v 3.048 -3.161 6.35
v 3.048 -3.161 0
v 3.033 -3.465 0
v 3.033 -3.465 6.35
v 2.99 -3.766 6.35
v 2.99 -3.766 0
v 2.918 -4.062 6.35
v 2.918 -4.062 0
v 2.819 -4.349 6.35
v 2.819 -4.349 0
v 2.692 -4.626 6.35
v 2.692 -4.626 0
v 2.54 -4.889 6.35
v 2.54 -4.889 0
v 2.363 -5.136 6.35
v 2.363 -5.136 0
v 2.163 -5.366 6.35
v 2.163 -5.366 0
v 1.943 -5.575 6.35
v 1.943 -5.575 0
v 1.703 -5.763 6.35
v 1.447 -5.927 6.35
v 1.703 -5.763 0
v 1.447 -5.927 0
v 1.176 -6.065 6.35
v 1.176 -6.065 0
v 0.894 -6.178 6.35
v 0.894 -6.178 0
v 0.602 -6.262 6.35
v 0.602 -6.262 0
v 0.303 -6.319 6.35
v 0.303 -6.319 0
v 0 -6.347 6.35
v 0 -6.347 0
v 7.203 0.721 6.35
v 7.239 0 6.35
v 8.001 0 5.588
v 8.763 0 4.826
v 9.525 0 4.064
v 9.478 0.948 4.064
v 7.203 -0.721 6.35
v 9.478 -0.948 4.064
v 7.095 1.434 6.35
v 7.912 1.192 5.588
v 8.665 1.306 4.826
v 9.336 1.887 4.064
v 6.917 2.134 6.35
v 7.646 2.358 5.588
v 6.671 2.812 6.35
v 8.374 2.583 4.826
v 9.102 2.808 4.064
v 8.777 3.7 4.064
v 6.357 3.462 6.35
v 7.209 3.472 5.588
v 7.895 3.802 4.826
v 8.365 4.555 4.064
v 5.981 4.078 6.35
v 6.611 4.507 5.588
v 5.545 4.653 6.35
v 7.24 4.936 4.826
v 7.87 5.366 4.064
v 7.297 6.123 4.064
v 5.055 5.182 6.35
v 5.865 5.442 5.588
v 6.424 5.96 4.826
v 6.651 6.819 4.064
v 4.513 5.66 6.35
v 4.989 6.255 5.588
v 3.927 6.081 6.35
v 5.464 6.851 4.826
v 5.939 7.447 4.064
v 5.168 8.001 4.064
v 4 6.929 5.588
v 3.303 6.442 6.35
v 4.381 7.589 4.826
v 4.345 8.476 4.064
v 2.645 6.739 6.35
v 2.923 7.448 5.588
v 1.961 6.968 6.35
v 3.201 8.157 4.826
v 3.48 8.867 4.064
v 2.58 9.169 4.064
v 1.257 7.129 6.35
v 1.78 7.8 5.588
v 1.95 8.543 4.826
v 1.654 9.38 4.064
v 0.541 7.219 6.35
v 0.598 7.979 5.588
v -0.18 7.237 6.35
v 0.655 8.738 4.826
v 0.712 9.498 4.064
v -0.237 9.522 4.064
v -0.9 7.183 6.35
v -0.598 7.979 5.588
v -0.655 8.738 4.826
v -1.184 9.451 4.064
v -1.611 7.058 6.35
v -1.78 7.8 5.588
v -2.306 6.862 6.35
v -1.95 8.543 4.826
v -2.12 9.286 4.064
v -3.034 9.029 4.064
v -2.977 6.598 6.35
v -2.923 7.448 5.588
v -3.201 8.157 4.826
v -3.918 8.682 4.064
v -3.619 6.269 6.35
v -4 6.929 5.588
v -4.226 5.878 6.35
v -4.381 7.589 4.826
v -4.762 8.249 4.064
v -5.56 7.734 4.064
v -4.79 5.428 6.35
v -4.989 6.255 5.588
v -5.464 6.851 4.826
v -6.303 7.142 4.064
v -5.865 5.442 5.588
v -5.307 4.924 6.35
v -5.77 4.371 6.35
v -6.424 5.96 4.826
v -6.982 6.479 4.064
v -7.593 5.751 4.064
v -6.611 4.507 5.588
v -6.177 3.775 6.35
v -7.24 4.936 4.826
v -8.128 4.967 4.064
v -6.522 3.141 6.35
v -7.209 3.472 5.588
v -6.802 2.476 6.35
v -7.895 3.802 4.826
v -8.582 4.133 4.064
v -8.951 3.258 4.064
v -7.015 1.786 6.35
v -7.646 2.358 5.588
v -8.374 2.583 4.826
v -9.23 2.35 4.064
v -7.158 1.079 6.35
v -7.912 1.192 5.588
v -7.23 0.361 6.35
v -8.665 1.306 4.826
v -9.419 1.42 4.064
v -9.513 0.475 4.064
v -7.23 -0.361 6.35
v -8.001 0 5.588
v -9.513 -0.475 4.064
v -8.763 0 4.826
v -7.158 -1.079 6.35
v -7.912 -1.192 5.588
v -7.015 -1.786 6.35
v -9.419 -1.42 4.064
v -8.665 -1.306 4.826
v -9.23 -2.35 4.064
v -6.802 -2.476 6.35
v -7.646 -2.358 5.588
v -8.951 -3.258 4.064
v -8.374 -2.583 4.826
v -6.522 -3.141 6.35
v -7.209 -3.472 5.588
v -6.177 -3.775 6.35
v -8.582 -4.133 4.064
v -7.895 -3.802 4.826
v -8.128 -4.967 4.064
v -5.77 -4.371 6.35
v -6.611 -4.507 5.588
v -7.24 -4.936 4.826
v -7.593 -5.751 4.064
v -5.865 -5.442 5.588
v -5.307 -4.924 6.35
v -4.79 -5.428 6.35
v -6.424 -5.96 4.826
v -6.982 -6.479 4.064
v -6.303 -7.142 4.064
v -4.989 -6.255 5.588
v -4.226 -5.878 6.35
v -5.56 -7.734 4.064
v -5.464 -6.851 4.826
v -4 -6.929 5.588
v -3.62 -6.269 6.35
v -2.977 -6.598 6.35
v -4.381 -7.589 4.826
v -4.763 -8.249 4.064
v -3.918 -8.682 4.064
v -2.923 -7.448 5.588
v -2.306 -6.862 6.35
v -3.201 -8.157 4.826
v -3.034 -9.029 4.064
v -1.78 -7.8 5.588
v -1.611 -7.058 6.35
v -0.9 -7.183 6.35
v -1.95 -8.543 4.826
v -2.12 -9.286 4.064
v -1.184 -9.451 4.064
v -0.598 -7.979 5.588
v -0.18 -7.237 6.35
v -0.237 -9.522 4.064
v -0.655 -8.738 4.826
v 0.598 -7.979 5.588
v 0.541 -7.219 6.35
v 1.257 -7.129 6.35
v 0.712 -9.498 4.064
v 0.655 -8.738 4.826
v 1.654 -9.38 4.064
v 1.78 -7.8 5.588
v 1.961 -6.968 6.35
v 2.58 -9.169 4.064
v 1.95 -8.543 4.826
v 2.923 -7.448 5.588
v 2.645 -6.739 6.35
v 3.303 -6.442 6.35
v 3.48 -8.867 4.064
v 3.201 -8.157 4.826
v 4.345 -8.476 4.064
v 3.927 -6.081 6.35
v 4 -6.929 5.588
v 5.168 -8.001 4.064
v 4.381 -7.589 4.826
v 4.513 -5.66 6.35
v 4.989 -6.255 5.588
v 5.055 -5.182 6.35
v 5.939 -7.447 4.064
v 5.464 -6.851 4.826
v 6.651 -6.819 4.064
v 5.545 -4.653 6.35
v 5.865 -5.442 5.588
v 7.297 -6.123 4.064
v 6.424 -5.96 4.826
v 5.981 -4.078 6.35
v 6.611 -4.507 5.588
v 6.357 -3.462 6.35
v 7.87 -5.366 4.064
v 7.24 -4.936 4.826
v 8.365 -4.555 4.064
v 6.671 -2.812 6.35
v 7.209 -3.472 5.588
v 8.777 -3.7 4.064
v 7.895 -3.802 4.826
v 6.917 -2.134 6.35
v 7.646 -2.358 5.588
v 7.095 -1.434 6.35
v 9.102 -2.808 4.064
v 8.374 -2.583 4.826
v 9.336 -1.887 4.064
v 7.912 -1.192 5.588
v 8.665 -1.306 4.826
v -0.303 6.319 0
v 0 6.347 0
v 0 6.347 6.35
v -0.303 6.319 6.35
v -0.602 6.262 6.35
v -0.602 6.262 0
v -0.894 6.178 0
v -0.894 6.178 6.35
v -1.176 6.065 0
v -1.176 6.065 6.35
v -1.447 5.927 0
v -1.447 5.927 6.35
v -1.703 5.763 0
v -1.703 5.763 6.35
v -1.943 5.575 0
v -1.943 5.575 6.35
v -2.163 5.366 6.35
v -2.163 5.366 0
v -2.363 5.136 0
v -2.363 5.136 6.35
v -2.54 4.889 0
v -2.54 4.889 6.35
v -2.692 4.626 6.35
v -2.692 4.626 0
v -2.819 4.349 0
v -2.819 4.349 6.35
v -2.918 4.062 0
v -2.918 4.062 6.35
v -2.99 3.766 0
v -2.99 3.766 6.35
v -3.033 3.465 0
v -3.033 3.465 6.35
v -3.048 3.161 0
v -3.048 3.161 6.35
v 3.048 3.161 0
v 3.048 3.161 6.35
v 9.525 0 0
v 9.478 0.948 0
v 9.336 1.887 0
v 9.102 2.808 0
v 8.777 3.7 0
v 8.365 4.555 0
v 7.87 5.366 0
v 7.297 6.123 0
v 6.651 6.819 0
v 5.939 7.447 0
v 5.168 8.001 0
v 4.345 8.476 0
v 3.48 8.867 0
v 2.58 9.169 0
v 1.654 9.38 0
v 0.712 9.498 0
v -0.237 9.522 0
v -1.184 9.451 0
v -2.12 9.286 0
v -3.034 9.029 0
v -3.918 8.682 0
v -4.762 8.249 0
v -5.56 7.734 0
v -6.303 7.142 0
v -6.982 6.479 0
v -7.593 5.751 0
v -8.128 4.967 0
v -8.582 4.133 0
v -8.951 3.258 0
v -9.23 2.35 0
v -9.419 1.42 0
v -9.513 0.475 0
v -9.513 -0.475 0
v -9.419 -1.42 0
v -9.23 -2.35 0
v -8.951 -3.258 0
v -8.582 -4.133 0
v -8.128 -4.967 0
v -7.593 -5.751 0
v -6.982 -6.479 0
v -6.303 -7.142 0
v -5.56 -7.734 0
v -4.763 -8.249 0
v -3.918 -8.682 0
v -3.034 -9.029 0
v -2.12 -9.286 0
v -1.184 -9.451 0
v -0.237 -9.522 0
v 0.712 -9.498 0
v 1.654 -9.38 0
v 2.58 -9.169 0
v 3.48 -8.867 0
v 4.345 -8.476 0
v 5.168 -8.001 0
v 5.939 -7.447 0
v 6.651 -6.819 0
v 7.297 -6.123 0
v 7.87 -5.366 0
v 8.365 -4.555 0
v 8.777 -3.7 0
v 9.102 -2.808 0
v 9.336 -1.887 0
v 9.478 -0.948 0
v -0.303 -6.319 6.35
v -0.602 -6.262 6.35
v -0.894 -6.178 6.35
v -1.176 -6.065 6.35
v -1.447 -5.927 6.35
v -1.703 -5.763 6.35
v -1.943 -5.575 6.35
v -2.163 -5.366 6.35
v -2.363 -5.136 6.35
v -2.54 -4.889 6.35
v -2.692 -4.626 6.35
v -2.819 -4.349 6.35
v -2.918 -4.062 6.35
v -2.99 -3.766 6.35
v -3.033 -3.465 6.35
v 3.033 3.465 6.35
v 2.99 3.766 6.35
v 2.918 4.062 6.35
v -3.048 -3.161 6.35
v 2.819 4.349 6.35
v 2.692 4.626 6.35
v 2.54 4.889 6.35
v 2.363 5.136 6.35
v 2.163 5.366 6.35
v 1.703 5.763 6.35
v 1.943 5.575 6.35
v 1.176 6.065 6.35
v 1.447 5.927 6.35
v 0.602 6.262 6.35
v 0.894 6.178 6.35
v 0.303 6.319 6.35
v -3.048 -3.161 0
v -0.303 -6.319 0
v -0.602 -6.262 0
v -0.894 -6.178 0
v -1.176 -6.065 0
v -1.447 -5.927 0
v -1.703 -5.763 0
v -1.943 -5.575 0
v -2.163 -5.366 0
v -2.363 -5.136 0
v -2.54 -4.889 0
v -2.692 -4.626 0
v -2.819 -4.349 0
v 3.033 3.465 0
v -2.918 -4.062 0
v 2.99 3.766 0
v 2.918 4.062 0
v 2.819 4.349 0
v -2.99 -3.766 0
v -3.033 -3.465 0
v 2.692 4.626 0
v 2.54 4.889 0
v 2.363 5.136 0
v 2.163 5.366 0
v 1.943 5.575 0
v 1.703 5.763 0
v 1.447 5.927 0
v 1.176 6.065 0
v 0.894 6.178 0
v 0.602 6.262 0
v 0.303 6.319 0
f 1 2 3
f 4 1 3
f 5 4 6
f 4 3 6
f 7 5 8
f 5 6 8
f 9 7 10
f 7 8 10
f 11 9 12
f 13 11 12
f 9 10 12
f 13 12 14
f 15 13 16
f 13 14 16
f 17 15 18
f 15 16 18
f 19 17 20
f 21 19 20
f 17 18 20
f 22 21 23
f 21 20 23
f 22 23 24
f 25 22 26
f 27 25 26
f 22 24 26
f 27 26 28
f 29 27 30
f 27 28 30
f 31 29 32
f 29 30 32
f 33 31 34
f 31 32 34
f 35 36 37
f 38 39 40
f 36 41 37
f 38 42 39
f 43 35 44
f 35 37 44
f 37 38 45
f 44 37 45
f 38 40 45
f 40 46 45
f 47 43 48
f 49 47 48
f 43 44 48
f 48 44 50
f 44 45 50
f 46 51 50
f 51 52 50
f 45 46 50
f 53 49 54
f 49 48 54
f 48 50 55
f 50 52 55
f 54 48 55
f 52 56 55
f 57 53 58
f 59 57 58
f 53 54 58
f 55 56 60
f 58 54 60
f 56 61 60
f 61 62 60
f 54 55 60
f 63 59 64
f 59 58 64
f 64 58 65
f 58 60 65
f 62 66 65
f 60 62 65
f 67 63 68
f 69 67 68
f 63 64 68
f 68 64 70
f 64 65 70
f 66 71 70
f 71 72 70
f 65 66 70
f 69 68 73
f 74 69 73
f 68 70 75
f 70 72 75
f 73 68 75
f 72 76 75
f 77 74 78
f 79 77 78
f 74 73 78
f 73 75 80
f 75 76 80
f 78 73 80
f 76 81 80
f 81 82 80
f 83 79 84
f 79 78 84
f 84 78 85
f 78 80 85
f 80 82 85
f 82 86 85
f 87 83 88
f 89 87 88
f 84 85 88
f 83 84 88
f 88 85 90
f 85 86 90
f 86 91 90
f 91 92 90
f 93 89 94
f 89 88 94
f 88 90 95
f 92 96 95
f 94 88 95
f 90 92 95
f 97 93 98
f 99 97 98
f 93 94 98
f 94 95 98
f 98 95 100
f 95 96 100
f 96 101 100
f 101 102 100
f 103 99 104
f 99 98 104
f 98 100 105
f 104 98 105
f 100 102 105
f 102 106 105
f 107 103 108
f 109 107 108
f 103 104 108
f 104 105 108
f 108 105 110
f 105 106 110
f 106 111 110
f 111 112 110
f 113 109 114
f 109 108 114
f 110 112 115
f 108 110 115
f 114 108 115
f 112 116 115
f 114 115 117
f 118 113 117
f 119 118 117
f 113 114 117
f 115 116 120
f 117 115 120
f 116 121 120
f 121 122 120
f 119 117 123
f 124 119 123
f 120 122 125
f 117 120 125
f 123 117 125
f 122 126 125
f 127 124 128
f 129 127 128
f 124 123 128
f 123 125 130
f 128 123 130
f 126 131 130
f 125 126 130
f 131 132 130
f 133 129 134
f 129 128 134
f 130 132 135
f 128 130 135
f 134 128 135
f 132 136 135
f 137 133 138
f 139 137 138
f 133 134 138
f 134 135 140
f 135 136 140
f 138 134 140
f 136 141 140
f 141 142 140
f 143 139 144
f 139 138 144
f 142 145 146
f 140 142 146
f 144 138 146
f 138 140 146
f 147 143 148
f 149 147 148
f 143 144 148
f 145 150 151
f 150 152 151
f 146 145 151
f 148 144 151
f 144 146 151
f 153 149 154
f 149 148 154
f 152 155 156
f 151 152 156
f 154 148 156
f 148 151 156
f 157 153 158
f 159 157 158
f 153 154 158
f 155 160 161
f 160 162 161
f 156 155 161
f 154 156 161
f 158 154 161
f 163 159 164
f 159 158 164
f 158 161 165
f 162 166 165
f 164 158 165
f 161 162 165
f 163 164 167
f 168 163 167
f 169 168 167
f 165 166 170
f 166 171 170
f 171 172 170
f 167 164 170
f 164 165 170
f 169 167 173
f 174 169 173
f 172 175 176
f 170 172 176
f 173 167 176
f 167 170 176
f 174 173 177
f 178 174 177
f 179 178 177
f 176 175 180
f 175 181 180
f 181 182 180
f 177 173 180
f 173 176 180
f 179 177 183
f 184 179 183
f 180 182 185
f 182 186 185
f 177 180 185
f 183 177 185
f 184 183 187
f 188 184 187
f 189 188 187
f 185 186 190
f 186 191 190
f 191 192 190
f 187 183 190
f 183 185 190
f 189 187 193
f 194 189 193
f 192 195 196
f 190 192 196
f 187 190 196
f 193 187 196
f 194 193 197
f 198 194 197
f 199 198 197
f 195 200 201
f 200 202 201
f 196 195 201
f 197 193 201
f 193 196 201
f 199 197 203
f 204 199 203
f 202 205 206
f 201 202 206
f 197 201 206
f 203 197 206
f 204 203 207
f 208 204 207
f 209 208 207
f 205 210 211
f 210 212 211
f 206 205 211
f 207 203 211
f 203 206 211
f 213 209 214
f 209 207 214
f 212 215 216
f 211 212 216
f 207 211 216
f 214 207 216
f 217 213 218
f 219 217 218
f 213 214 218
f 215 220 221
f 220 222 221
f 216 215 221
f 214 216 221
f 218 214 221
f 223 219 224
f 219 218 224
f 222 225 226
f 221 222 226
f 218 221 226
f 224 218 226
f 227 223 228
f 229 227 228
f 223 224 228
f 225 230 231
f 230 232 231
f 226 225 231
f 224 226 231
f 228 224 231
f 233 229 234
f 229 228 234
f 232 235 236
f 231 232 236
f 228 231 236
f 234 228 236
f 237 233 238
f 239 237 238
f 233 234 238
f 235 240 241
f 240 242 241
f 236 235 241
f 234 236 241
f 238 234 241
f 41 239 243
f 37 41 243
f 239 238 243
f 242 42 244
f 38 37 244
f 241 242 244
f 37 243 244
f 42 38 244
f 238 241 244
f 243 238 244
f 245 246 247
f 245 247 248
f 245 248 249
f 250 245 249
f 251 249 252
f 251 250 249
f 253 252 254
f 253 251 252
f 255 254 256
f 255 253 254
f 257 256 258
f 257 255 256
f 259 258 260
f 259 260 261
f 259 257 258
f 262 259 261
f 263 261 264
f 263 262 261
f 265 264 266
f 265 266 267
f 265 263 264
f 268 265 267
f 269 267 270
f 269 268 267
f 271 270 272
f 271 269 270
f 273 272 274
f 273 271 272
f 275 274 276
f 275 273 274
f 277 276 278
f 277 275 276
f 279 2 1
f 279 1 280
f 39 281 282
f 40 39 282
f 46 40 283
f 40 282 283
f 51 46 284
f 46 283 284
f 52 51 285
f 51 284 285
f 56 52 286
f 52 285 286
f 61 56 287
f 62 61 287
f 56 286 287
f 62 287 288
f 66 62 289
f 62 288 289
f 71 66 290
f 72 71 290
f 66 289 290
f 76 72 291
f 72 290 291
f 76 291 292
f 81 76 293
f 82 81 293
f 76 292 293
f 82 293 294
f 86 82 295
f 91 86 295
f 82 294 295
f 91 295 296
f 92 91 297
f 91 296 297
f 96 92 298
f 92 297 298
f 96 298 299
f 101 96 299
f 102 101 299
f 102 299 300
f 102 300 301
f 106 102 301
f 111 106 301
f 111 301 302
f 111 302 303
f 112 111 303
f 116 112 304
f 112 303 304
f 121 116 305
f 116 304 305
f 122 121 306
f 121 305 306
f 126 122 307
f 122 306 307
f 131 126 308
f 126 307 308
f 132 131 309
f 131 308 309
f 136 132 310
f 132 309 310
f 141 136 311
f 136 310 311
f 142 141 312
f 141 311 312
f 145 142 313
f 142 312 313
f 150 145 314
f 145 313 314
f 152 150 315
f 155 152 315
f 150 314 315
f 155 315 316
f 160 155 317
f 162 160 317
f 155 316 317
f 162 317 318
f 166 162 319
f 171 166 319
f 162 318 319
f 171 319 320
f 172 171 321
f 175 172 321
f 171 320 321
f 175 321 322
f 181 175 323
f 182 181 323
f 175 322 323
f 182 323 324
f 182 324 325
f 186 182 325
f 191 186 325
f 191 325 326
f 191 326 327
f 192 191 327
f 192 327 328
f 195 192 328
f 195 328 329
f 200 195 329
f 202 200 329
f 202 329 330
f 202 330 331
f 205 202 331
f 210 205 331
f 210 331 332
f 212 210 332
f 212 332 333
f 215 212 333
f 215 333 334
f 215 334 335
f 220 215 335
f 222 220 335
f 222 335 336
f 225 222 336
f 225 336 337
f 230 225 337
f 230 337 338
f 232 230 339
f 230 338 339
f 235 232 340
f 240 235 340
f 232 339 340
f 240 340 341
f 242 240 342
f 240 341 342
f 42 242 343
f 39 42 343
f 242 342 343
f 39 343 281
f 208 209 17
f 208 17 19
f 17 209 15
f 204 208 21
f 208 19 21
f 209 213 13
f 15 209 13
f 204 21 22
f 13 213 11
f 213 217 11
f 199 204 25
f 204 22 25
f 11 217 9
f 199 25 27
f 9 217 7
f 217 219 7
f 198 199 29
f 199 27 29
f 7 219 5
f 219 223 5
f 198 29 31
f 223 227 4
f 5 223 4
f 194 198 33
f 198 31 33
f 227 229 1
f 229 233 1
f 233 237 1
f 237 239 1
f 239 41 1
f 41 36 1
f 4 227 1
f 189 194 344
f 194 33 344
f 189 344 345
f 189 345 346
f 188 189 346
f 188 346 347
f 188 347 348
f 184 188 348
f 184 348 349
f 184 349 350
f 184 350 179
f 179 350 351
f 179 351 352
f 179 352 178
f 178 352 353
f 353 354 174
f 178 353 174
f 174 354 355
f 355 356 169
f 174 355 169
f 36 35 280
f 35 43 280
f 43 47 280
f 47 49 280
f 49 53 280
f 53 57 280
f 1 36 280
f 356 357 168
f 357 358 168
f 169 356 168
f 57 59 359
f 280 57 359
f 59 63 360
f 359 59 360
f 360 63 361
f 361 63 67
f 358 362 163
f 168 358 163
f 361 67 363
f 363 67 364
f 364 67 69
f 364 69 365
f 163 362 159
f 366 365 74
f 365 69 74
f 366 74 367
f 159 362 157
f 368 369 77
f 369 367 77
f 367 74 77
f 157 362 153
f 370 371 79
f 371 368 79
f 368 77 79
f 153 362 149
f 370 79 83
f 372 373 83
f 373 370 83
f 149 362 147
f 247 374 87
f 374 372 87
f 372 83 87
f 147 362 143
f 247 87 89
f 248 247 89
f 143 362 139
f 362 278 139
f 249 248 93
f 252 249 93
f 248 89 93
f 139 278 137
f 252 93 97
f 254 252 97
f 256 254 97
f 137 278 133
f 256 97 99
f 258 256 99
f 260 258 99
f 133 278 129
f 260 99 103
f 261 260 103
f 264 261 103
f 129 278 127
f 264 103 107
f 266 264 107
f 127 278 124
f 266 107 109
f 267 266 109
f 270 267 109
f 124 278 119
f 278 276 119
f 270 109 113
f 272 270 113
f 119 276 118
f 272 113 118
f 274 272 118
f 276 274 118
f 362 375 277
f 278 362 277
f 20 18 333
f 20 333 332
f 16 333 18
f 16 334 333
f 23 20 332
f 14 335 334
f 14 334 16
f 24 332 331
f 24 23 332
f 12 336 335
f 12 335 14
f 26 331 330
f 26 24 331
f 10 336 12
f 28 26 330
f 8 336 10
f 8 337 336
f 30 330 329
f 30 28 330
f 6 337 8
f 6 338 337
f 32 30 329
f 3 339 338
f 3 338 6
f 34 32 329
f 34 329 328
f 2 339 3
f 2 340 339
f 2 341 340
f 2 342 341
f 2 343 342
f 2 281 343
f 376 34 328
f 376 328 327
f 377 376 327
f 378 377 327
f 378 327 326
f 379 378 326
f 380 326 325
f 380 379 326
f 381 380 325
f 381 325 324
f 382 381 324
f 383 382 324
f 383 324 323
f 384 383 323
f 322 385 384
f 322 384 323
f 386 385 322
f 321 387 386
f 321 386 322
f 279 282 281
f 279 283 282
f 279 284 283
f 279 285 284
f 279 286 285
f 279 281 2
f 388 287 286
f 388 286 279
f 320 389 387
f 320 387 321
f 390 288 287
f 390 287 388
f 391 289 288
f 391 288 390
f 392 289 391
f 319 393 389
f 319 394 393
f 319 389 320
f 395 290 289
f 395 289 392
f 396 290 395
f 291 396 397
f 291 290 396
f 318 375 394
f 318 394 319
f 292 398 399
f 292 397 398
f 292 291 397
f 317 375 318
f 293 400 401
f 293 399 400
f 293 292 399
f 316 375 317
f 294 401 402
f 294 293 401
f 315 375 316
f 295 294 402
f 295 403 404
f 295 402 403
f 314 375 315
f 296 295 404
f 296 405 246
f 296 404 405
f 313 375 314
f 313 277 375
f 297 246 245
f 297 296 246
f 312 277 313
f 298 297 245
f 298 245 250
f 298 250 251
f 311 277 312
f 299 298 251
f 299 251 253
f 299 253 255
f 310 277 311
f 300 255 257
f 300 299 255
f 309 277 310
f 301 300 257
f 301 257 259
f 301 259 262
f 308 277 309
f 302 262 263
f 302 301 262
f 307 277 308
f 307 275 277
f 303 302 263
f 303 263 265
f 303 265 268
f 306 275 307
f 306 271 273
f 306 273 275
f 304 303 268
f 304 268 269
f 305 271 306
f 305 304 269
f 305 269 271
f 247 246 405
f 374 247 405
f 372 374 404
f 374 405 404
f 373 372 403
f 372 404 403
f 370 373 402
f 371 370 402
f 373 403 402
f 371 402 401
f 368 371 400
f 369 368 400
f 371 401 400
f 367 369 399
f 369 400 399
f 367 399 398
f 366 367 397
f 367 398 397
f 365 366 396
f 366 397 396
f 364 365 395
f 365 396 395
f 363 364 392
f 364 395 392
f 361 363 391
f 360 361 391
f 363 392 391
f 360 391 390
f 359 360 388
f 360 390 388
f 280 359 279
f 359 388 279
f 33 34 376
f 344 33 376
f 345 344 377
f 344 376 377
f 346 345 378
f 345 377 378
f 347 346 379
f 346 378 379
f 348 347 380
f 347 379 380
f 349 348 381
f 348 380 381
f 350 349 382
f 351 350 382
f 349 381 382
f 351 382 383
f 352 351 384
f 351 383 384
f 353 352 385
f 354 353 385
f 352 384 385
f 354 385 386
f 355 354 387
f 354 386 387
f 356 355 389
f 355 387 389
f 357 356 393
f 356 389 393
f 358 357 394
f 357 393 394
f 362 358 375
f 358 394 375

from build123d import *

# Parameters (mm, degrees)
F0_R        = 9.525
F0_W        = 6.096
F0_H        = 12.7
F1_DEPTH    = 6.35
F2_T1_DEPTH = 6.35
F3_SIZE     = 2.286


# Not quite as in the source:
# - a fillet or chamfer that OpenCascade refuses, or shapes differently, is made with other operations: its cross-section is extruded or revolved along the edge and cut away or added


with BuildPart() as f1:
    # F0 (on Top) → F1 (new body)
    with BuildSketch(Plane.XY):
        Circle(F0_R)
        Rectangle(F0_W, F0_H, mode=Mode.SUBTRACT)
    extrude(amount=F1_DEPTH)

    # F2: fillet of radius 3.1886932732 on 4 edges, made by hand

    # F2_s2 → F2_t1 (join)
    with BuildSketch(Plane.XY):
        with BuildLine():
            ThreePointArc((0.1406932732, 6.35), (-2.1140533634, 5.4160533634), (-3.048, 3.1613067268))
            Line((-3.048, 3.1613067268), (-3.048, 6.35))
            Line((-3.048, 6.35), (0.1406932732, 6.35))
        make_face()
        with BuildLine():
            ThreePointArc((-0.1406932732, 6.35), (2.1140533634, 5.4160533634), (3.048, 3.1613067268))
            Line((3.048, 3.1613067268), (3.048, 6.35))
            Line((3.048, 6.35), (-0.1406932732, 6.35))
        make_face()
        with BuildLine():
            ThreePointArc((0.1406932732, -6.35), (-2.1140533634, -5.4160533634), (-3.048, -3.1613067268))
            Line((-3.048, -3.1613067268), (-3.048, -6.35))
            Line((-3.048, -6.35), (0.1406932732, -6.35))
        make_face()
        with BuildLine():
            ThreePointArc((3.048, -3.1613067268), (2.1140533634, -5.4160533634), (-0.1406932732, -6.35))
            Line((-0.1406932732, -6.35), (3.048, -6.35))
            Line((3.048, -6.35), (3.048, -3.1613067268))
        make_face()
    extrude(amount=F2_T1_DEPTH)

    # F3
    f3_edges = [f1.edges().sort_by_distance(p)[0] for p in [
        (-9.525, 0, 6.35),
    ]]
    chamfer(f3_edges, length=F3_SIZE)


solid = f1.part
